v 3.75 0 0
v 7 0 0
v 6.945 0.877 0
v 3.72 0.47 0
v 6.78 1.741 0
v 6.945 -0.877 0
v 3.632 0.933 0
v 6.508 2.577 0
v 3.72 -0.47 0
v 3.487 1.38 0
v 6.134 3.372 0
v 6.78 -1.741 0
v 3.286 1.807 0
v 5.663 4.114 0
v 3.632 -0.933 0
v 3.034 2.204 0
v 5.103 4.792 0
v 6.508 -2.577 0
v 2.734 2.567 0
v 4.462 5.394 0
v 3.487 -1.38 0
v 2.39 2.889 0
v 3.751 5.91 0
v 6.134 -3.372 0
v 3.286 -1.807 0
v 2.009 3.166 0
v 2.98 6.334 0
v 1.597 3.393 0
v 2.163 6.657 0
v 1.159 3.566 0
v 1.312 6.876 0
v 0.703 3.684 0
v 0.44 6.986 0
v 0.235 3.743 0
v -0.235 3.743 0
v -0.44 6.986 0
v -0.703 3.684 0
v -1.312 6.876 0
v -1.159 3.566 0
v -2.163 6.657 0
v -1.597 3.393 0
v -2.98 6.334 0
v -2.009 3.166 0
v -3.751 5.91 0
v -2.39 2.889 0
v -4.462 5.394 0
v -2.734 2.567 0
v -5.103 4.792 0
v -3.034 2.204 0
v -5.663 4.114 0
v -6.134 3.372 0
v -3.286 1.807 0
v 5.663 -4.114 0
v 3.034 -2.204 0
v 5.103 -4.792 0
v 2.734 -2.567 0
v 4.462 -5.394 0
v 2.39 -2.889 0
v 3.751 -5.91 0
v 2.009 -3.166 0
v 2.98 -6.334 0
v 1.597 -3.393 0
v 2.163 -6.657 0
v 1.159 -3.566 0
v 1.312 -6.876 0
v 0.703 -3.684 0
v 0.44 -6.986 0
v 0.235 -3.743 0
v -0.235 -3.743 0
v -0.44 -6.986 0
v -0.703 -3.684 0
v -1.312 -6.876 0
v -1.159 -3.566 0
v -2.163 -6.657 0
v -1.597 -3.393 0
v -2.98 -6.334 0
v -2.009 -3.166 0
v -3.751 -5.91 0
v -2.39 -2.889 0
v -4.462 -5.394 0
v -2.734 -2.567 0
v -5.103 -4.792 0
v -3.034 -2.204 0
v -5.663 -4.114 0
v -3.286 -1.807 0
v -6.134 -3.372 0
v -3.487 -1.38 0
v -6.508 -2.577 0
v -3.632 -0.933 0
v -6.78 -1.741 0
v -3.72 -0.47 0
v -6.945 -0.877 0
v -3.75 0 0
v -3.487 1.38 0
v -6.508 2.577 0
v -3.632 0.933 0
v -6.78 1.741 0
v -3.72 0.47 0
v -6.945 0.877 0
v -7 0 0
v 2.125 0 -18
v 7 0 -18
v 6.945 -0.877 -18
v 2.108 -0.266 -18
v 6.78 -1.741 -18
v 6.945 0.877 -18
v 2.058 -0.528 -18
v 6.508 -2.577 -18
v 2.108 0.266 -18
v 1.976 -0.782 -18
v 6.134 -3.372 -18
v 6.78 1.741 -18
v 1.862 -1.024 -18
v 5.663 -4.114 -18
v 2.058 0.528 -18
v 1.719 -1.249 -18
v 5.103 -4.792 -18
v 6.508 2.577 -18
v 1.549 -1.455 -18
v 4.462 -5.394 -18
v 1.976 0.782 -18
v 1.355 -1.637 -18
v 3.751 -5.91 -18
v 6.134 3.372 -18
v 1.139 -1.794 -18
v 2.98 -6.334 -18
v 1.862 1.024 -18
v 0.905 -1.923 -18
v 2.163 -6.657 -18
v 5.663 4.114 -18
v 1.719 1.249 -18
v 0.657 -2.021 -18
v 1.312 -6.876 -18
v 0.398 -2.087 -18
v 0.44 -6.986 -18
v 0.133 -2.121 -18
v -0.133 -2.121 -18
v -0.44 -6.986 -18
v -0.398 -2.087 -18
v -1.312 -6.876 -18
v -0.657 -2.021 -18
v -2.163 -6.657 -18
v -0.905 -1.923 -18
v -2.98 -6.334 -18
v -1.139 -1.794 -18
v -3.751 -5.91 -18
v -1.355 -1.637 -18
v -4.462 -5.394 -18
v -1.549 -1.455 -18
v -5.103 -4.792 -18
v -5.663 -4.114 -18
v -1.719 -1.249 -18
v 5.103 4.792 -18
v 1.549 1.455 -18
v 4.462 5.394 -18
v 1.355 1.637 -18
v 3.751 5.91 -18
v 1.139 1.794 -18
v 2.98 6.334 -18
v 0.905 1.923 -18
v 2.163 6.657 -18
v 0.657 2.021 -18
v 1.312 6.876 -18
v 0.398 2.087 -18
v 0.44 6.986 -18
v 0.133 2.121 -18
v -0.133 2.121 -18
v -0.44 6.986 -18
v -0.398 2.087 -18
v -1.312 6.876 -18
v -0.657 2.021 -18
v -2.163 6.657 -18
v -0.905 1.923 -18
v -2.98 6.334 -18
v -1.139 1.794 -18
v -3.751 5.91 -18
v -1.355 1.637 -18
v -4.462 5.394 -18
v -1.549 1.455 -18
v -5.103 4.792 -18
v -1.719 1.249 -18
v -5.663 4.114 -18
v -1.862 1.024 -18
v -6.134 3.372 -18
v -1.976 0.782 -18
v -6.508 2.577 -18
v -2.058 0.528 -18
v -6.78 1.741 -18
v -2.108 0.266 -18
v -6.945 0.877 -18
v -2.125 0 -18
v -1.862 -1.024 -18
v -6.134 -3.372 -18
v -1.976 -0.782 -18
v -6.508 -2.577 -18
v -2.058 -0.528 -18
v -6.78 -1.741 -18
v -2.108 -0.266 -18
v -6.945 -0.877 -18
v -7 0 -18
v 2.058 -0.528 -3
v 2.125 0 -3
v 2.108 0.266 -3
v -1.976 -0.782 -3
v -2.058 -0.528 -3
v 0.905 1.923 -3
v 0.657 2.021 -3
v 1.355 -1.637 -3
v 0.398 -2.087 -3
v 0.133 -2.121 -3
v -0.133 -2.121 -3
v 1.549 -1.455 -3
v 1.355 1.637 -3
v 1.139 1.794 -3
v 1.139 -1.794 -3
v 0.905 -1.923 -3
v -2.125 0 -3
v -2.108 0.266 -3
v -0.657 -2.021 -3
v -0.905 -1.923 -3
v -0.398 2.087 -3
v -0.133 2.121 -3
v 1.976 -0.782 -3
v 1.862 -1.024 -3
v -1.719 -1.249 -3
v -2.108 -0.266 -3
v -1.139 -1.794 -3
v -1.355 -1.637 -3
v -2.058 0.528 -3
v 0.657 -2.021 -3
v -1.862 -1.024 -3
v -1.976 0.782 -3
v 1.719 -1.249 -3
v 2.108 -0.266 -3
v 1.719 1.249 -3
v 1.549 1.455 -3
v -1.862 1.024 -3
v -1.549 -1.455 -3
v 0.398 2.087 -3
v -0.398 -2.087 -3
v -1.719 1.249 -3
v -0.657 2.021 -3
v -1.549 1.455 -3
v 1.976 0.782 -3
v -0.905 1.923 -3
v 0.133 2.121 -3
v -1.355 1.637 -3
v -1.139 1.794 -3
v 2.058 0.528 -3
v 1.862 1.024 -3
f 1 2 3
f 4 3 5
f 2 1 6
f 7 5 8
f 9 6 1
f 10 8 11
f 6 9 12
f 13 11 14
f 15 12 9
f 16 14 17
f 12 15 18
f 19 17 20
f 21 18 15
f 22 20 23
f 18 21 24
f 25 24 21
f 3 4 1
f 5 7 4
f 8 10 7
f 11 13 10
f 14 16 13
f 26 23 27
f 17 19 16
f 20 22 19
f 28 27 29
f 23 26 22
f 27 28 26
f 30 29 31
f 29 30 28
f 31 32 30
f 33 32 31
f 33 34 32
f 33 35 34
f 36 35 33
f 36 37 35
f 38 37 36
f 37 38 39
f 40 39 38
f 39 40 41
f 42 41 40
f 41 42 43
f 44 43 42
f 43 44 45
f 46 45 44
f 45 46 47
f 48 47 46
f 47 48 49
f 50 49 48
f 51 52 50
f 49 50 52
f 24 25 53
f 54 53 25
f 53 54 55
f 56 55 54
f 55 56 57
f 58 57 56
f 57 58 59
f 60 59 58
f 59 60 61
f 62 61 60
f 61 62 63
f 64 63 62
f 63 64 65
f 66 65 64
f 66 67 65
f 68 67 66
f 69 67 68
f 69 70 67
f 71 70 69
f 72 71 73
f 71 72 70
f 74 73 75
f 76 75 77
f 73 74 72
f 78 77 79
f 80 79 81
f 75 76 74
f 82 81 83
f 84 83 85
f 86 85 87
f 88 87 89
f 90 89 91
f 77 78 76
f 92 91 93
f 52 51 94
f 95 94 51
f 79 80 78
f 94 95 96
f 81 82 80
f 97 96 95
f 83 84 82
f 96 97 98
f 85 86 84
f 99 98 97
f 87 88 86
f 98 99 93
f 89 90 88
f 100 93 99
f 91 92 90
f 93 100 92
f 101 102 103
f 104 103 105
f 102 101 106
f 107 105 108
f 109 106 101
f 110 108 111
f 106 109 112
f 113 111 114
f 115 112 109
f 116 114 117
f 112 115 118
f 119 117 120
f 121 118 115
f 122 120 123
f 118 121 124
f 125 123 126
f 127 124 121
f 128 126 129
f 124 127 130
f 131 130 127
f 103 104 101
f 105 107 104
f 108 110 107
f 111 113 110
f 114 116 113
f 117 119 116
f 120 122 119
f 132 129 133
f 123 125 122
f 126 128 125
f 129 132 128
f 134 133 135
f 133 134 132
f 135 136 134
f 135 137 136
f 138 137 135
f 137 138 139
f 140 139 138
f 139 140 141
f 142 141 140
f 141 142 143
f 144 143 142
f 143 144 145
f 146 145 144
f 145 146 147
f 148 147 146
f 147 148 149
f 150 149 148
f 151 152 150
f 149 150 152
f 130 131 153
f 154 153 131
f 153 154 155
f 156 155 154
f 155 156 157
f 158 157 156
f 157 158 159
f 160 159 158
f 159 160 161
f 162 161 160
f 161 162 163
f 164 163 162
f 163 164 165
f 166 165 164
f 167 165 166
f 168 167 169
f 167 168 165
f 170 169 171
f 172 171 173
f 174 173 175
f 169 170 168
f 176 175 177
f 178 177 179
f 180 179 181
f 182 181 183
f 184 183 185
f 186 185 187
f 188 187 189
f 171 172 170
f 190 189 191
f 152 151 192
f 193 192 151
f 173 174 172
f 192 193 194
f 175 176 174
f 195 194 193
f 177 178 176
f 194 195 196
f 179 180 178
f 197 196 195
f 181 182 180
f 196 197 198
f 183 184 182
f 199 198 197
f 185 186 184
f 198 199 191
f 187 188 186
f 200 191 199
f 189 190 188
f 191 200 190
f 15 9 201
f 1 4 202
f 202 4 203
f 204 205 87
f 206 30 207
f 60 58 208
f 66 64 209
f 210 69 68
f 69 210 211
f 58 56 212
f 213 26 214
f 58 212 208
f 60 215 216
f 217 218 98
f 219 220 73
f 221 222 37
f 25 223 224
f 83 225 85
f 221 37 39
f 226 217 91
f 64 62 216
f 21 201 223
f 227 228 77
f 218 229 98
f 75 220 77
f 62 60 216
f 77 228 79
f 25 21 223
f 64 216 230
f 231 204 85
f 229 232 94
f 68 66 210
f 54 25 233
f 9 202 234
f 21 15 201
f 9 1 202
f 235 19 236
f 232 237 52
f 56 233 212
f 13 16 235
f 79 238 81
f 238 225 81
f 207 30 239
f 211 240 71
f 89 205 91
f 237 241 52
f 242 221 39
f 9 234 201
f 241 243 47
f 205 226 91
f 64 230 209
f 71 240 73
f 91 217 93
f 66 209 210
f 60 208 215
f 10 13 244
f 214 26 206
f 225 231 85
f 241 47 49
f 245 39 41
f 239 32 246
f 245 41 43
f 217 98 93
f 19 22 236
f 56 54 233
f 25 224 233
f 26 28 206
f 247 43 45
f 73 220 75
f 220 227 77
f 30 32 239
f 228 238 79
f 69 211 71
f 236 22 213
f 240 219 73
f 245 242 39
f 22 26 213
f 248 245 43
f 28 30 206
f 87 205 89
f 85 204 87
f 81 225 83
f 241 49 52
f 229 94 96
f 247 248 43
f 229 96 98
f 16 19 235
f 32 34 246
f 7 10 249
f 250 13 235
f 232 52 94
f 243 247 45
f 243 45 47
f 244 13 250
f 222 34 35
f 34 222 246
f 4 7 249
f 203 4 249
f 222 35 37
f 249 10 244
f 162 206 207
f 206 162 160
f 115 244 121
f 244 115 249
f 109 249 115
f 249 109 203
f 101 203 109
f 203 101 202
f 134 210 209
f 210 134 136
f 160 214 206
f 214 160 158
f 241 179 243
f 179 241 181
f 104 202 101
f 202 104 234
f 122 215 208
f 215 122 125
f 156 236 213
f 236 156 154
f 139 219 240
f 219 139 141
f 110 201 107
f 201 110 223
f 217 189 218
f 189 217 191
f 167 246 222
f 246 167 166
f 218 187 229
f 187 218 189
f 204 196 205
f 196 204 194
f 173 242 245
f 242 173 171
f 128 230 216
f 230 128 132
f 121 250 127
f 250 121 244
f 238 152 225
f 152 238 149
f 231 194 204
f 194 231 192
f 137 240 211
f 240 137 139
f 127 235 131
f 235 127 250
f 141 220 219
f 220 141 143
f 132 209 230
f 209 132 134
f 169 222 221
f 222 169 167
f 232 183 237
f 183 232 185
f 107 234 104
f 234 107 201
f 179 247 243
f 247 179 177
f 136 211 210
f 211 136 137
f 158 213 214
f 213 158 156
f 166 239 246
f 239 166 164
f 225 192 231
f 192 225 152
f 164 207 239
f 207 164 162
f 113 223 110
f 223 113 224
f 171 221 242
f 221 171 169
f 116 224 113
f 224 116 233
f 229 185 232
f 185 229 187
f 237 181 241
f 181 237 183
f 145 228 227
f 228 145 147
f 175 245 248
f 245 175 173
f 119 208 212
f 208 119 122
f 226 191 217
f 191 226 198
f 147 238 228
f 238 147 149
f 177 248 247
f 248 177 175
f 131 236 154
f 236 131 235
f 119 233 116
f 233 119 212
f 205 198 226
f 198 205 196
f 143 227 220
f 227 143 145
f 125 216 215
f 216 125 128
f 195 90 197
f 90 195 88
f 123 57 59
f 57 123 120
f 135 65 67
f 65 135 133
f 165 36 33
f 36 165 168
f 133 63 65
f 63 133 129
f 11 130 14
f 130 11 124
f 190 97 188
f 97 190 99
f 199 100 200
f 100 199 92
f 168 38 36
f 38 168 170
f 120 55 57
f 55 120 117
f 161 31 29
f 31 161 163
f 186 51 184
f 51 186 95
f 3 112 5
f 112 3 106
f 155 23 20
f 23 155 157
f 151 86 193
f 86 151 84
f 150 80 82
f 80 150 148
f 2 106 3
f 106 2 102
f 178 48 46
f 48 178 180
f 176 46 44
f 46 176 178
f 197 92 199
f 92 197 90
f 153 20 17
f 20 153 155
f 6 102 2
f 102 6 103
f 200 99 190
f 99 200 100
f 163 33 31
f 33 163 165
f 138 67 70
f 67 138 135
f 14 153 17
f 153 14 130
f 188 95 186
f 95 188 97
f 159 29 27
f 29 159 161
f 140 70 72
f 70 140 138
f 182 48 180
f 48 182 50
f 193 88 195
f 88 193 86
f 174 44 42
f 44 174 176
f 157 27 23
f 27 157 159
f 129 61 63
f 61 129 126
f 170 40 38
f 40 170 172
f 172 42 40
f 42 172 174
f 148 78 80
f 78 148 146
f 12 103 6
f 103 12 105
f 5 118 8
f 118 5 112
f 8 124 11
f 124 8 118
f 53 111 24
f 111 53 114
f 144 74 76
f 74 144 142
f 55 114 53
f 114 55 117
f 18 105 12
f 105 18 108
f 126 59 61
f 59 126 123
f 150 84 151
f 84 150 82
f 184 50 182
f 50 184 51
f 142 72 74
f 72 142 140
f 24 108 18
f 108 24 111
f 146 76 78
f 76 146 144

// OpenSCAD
$fn = 50;


difference() {
	union() {
		translate(v = [0, 0, -18.0000000000]) {
			cylinder(h = 18, r = 7.0000000000);
		}
		cylinder(h = 0, r = 17.0000000000);
	}
	union() {
		translate(v = [0, 0, 0]) {
			rotate(a = [0, 0, 0]) {
				difference() {
					union() {
						#translate(v = [0, 0, -18.0000000000]) {
							cylinder(h = 18, r = 2.0000000000);
						}
						#translate(v = [0, 0, -3]) {
							cylinder(h = 3, r = 7.0000000000, r1 = 2.1250000000, r2 = 3.7500000000);
						}
						#translate(v = [0, 0, -18.0000000000]) {
							cylinder(h = 18, r = 2.1250000000);
						}
						#translate(v = [0, 0, -18.0000000000]) {
							cylinder(h = 18, r = 2.0000000000);
						}
					}
					union();
				}
			}
		}
	}
}
